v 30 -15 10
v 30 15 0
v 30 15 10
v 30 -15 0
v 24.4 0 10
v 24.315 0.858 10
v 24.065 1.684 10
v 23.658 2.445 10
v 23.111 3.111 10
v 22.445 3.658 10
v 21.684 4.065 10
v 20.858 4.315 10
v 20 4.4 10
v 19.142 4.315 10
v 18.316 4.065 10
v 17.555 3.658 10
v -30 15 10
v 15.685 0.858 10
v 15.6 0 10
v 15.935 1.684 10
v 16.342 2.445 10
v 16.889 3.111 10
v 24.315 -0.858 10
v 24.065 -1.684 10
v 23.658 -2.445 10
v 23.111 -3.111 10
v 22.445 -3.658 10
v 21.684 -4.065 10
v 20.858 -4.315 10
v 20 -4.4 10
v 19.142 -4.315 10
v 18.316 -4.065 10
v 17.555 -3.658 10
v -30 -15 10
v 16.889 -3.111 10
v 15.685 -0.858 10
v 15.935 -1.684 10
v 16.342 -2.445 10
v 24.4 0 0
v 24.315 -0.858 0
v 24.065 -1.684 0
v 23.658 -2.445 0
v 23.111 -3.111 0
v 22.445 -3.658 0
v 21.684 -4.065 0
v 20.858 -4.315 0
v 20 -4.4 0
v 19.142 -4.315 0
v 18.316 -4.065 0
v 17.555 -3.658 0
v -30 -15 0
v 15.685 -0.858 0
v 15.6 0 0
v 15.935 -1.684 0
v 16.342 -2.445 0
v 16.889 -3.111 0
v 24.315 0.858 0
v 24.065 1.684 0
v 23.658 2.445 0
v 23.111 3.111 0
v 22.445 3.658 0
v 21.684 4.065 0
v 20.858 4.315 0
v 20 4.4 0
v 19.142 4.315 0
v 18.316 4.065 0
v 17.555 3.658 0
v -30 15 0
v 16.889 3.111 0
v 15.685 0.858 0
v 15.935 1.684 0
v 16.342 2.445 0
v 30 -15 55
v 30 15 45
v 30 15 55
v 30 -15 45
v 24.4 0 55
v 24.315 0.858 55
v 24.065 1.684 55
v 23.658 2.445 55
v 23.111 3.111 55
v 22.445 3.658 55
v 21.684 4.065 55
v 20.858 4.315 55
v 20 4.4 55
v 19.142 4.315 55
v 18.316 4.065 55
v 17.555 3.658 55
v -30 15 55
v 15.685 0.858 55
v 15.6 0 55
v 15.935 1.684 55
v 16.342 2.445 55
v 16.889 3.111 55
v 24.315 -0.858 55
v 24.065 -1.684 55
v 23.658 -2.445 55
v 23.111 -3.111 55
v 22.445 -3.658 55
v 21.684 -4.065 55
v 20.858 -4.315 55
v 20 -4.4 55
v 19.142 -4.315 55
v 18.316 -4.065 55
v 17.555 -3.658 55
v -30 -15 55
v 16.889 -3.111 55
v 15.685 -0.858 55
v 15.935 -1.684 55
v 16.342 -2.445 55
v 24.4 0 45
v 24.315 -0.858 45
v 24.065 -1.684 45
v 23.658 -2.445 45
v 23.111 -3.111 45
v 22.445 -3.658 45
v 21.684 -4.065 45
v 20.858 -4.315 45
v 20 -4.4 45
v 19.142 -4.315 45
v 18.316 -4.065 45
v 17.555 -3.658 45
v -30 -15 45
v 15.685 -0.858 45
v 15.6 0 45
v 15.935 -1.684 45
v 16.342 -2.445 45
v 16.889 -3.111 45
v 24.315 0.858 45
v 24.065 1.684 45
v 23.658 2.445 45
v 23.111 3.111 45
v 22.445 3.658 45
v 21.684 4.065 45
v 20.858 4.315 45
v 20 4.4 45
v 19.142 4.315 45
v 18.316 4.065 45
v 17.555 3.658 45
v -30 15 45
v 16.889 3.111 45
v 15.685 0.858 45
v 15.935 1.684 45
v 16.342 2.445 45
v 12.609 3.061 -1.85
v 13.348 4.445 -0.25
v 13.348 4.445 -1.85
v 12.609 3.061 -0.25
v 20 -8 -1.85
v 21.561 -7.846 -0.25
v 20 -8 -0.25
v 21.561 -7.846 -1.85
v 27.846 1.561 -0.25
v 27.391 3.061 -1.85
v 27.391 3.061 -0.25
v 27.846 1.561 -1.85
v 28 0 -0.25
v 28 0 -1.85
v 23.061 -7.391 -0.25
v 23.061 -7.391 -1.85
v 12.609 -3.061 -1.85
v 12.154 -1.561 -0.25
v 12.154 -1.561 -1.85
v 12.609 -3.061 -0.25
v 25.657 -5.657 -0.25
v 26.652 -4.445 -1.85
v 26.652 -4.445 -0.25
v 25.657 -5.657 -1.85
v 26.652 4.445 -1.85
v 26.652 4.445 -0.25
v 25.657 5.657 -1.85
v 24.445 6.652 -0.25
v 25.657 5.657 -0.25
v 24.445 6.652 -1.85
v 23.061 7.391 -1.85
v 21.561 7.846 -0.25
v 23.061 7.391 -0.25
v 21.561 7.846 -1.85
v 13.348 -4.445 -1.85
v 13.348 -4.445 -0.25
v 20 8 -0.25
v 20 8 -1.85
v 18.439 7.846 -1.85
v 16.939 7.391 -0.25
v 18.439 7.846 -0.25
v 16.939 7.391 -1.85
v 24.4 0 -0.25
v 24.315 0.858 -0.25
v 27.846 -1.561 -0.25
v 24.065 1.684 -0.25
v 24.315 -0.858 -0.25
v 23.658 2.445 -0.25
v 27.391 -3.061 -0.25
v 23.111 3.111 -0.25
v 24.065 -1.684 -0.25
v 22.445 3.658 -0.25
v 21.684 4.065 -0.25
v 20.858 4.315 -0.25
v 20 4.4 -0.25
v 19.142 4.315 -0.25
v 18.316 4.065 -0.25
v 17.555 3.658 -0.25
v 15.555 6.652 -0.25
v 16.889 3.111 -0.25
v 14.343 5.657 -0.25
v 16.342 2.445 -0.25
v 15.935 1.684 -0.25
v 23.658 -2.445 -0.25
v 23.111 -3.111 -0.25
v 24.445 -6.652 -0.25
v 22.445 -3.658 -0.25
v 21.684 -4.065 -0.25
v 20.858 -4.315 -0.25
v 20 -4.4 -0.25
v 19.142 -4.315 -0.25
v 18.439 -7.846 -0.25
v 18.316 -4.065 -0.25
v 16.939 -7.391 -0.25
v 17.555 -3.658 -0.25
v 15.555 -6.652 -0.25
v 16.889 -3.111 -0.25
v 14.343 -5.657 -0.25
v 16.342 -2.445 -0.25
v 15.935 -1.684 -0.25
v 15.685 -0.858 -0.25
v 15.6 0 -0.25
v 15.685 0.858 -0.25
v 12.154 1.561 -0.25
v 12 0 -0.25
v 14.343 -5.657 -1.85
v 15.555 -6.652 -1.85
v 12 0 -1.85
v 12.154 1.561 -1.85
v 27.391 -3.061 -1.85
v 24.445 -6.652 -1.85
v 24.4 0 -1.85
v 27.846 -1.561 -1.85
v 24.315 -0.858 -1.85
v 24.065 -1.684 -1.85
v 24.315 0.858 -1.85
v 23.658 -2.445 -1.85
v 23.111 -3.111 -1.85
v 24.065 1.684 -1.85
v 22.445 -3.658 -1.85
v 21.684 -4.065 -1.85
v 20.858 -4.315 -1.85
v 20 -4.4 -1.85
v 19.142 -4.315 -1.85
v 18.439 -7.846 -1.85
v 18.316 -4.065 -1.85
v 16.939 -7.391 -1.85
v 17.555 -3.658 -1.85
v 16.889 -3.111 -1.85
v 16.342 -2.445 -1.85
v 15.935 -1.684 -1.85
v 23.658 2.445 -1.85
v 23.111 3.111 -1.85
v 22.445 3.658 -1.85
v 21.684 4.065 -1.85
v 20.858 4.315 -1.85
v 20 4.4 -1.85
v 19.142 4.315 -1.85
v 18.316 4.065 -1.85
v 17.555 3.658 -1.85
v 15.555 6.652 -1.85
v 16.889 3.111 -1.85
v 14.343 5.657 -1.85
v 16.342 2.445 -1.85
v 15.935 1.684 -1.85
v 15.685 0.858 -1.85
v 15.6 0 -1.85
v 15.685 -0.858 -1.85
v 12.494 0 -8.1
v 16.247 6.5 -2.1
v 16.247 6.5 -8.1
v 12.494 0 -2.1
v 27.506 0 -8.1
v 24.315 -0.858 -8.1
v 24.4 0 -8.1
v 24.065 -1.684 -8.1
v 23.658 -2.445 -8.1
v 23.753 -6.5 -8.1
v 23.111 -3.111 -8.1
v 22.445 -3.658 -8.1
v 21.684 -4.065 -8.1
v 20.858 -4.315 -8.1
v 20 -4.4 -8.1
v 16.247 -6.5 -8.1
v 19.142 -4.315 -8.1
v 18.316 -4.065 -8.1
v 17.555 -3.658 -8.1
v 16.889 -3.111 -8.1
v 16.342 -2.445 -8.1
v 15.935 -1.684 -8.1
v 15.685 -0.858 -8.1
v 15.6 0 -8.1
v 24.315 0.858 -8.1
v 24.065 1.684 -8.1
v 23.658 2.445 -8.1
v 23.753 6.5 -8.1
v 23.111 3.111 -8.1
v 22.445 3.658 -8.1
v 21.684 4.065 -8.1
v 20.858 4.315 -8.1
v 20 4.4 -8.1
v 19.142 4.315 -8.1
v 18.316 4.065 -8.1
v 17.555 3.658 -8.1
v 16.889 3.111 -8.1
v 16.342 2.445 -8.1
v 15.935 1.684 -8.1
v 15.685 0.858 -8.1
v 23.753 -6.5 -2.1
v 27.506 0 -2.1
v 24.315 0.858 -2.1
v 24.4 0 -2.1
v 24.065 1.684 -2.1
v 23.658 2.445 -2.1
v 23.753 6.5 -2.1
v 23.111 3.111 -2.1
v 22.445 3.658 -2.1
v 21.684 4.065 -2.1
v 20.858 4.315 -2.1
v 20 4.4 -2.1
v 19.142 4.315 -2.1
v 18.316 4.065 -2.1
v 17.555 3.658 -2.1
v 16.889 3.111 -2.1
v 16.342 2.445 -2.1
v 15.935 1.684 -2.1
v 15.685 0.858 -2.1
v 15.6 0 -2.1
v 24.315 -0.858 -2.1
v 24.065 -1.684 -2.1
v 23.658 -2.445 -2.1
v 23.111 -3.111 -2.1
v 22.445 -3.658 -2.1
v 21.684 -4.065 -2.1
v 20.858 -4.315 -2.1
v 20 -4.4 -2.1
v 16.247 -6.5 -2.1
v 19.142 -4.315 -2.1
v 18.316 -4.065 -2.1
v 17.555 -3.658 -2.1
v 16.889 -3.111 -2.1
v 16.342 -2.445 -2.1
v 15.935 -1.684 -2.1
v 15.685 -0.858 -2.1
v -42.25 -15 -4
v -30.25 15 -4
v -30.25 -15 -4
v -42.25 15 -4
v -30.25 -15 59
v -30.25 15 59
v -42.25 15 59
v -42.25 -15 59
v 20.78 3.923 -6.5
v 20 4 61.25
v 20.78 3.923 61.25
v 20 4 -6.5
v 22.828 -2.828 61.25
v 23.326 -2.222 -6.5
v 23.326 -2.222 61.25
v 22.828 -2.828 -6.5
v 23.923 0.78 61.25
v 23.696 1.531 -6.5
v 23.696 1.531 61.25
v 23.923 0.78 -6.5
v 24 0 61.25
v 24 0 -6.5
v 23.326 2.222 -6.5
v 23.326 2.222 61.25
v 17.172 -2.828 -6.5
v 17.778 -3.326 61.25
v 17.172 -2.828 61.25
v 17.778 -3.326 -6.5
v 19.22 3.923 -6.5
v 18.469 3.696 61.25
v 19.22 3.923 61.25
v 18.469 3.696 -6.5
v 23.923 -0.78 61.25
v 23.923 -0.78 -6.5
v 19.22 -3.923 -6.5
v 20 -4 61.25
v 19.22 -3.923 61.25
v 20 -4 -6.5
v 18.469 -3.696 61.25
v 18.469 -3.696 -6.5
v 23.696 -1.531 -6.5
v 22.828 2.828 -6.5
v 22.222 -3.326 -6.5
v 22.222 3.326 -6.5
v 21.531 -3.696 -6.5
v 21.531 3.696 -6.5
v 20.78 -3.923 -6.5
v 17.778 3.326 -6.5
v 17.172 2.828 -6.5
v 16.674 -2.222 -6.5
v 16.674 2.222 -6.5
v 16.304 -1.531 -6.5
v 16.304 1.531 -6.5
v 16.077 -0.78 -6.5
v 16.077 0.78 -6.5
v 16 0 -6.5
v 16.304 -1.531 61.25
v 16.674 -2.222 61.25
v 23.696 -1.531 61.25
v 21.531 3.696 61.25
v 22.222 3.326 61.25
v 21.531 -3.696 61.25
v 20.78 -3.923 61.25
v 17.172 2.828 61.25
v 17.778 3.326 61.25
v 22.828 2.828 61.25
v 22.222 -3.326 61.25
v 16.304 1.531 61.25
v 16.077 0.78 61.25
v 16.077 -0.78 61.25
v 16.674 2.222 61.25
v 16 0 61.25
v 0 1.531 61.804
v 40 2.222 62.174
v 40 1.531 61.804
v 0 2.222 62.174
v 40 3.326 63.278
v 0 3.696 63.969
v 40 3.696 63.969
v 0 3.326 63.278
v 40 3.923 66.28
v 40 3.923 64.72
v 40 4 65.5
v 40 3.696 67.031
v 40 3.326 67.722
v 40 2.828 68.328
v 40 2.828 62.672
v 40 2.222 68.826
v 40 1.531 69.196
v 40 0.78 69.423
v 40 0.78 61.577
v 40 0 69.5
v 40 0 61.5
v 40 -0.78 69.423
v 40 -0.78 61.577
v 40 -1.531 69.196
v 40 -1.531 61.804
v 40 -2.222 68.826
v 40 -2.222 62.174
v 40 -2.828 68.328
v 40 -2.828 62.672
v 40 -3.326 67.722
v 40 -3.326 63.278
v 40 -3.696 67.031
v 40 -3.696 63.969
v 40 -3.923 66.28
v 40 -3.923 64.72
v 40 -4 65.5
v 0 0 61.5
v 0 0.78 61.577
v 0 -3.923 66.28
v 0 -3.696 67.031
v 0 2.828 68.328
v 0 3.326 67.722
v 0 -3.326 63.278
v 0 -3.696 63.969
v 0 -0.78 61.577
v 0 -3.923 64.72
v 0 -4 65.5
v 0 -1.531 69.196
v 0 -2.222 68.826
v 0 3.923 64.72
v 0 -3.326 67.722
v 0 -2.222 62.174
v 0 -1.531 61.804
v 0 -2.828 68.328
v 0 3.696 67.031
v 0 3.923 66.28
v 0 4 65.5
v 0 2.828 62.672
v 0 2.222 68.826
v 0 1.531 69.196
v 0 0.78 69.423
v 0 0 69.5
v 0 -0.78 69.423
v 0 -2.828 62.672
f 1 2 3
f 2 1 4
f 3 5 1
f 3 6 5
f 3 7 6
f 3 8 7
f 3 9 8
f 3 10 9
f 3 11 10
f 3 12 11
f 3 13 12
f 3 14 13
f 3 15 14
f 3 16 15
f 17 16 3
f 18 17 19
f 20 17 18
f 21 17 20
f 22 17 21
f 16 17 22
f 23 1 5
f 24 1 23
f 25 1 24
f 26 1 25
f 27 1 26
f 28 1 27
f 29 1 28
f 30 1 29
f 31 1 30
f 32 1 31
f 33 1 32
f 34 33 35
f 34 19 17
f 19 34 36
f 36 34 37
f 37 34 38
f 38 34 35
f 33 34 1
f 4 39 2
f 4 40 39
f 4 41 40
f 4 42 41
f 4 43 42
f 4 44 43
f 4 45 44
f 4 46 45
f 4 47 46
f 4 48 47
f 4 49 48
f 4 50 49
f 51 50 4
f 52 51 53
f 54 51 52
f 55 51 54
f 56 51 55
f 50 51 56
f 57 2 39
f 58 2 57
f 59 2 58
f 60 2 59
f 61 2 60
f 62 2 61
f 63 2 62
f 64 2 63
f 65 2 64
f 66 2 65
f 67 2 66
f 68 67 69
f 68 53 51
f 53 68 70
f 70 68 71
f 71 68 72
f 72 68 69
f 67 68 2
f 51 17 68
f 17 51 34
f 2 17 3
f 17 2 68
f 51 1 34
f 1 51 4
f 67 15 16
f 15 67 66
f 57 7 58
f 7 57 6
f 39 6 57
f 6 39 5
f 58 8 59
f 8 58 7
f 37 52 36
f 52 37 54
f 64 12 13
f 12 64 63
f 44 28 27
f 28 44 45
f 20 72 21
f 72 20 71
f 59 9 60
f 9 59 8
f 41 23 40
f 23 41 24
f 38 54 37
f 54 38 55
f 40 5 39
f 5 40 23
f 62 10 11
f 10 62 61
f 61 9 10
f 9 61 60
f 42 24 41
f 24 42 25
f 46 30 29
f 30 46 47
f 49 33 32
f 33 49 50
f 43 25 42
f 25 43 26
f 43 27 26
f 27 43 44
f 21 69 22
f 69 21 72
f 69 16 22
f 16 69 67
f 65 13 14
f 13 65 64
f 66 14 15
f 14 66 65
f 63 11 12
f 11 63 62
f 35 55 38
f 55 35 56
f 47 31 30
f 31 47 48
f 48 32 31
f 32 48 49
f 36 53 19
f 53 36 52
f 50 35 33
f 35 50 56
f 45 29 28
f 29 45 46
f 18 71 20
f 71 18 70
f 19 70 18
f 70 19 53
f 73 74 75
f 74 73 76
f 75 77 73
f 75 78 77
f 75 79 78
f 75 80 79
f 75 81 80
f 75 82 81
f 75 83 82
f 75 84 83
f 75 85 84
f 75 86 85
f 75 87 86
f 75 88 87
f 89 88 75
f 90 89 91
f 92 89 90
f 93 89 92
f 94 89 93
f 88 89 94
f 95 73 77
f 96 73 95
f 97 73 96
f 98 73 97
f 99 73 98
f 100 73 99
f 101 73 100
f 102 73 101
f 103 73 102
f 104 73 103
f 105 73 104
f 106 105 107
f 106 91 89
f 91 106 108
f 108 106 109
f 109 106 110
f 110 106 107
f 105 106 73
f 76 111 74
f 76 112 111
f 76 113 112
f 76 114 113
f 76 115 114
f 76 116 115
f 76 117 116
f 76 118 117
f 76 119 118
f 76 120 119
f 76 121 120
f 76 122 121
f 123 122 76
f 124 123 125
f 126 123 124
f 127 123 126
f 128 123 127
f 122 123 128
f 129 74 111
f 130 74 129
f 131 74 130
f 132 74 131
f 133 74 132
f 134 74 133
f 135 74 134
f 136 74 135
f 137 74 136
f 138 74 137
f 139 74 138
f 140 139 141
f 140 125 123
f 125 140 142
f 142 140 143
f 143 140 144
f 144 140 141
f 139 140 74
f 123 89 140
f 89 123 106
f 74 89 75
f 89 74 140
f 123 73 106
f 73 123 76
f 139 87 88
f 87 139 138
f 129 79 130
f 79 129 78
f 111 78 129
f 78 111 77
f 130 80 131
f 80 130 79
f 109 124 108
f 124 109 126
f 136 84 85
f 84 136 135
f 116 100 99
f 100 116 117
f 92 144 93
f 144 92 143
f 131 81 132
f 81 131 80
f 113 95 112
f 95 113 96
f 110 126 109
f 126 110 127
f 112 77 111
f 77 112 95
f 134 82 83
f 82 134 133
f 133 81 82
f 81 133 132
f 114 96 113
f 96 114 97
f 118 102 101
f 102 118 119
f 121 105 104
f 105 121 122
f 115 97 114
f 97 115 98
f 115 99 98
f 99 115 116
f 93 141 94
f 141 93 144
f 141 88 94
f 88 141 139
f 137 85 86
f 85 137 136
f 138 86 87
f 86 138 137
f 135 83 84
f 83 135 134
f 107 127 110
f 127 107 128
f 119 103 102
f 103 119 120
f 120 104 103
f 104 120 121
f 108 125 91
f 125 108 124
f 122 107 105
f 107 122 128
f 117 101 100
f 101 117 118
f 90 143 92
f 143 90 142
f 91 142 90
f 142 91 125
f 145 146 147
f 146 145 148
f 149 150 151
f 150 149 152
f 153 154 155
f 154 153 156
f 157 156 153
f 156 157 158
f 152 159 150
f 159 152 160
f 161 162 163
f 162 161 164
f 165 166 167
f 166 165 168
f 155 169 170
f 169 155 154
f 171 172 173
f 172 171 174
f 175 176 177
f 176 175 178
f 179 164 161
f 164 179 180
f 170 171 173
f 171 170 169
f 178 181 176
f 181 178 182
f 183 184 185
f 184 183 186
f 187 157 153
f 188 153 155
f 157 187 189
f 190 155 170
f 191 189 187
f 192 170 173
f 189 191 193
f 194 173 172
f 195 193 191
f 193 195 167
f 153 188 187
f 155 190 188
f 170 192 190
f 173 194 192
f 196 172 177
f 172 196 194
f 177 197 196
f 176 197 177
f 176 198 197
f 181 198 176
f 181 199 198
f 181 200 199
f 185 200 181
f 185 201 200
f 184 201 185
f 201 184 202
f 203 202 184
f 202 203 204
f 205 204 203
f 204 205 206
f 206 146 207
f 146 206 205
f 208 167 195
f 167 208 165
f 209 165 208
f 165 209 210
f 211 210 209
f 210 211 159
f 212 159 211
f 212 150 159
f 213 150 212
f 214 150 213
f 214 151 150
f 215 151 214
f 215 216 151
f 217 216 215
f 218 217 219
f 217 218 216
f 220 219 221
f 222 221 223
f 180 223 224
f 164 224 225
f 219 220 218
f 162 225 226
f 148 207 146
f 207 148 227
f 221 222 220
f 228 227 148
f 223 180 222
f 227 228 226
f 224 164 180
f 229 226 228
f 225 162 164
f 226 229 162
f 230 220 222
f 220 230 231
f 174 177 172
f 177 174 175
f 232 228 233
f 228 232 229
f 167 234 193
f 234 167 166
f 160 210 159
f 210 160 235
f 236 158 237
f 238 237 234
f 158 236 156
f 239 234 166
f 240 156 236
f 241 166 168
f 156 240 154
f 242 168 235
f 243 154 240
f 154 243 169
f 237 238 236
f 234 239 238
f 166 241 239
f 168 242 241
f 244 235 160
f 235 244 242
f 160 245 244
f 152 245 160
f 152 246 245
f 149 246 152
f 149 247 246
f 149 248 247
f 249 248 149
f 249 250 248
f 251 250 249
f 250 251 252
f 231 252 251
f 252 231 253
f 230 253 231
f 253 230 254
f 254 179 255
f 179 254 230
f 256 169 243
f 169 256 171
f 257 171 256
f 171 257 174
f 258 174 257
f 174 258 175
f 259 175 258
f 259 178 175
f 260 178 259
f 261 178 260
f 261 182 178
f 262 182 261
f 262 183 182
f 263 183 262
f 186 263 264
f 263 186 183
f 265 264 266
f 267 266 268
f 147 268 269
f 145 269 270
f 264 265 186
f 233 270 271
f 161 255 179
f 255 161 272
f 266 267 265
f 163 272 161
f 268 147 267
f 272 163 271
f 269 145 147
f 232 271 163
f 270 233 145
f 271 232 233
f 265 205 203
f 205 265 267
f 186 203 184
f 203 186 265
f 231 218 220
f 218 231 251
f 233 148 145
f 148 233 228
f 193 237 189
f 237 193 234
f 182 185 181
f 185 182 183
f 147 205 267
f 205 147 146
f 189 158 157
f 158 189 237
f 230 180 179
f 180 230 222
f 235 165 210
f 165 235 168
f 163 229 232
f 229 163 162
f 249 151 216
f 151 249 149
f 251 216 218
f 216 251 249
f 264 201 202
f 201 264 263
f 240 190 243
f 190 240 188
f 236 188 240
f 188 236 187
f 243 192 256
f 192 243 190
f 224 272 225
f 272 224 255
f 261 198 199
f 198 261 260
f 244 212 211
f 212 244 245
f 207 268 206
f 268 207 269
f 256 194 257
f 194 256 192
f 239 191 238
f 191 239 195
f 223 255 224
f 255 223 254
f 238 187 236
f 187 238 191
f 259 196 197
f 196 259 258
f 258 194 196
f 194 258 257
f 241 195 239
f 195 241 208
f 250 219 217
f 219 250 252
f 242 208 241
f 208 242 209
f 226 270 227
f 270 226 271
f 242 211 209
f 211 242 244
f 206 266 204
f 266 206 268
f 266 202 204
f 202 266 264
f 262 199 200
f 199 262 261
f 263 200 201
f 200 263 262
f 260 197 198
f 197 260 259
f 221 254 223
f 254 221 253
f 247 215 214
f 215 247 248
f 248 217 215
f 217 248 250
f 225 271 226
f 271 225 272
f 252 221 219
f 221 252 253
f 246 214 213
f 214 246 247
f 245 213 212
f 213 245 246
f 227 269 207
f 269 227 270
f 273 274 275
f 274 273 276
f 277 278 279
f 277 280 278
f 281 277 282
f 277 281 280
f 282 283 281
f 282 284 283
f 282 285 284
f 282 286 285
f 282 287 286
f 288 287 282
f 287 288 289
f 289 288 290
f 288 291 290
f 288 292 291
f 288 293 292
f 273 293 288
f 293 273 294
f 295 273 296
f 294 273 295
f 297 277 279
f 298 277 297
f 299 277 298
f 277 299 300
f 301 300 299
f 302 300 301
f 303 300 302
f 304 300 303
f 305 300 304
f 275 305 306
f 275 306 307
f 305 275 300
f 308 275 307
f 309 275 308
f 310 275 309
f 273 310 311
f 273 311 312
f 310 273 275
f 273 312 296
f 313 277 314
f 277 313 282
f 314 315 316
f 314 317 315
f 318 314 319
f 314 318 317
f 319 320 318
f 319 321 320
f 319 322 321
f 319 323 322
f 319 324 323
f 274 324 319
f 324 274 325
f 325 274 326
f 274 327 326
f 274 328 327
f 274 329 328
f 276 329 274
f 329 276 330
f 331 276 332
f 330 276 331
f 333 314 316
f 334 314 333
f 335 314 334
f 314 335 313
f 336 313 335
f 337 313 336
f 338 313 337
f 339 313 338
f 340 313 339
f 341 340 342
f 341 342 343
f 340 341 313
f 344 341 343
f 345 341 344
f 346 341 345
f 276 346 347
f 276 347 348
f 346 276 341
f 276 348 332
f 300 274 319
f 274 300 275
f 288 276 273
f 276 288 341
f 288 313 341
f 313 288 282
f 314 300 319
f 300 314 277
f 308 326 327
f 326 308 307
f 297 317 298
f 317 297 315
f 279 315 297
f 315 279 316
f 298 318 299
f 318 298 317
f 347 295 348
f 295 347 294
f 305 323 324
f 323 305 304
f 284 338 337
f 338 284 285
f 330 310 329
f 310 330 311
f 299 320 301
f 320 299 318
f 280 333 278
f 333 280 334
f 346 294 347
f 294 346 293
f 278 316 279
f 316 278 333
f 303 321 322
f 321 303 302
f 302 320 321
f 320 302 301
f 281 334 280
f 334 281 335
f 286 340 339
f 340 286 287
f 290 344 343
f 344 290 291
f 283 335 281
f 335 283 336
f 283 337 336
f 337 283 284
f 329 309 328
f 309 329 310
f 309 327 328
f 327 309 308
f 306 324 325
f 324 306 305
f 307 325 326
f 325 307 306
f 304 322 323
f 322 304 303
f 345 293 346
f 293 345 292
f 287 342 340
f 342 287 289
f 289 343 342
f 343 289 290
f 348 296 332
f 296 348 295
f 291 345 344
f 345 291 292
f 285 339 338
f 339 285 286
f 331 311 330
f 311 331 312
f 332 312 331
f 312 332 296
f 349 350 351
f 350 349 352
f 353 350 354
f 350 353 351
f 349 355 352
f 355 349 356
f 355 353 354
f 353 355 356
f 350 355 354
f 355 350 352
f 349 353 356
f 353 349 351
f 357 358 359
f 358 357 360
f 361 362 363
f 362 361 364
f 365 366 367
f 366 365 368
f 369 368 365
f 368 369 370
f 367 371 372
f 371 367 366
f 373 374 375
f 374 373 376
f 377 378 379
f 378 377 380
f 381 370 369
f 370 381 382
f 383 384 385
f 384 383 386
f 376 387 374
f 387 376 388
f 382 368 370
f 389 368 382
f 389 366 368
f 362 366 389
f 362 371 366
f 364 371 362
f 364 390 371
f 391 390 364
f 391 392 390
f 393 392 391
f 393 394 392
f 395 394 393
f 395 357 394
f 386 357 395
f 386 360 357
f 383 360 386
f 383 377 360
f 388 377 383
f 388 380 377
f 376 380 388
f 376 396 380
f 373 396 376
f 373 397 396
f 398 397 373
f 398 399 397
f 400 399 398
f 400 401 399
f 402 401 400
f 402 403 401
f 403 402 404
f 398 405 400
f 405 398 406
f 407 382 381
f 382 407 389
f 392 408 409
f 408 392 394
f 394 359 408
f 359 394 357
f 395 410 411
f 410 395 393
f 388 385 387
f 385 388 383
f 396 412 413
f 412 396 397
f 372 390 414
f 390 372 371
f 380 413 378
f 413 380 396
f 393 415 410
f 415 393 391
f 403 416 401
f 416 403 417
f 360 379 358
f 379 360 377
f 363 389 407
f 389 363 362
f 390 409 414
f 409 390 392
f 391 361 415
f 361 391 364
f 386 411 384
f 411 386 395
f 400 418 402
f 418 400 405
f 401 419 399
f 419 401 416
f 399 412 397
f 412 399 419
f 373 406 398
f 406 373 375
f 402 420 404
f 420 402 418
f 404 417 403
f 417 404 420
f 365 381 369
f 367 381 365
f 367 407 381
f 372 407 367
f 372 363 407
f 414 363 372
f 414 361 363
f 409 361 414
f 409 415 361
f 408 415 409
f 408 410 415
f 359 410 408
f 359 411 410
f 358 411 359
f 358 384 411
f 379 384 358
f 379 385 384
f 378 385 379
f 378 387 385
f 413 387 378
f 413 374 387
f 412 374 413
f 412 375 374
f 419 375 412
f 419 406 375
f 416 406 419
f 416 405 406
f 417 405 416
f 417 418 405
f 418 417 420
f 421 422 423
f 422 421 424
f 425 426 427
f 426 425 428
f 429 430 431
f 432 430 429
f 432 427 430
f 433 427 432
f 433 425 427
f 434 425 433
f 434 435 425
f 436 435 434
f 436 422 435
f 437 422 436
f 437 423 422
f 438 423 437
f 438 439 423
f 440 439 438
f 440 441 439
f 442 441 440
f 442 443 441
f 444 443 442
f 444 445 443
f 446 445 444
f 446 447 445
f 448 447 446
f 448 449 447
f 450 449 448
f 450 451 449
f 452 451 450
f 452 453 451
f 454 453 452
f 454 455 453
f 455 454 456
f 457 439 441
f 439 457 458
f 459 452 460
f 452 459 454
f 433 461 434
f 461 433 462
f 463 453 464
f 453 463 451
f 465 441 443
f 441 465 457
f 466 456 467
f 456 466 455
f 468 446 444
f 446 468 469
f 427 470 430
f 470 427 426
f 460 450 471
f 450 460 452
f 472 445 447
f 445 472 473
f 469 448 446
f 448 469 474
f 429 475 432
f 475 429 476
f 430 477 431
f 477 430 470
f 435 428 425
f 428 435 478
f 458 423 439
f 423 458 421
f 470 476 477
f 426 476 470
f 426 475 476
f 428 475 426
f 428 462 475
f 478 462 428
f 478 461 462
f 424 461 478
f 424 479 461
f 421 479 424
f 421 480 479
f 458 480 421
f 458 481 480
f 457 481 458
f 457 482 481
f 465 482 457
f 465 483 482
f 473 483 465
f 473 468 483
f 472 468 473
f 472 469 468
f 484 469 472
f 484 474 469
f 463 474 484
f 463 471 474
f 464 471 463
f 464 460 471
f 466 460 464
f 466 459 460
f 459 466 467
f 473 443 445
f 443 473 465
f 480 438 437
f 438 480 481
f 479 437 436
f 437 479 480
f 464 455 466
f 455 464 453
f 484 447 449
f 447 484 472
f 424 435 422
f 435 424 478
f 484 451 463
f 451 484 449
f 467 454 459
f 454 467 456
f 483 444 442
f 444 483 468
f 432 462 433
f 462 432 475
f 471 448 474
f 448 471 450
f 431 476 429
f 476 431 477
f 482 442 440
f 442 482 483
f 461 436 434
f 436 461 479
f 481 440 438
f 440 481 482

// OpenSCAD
$fn = 32;

// ------------------------------------------------------------------------
// C clamp: throat 45 mm, screw d8
// Every part is its own module, assembly() places every instance.
// ------------------------------------------------------------------------

// --- part 1 ---
module clamp_arm() {
  difference() {
    translate([-30, -15, 0]) cube([60, 30, 10]);
    translate([20, 0, -1]) cylinder(h = 12, d = 8.8);
  }
}

// --- part 2 ---
module clamp_spine() {
  difference() {
    translate([-31.5, -15, 0]) cube([63, 30, 12]);
  }
}

// --- part 3 ---
module clamp_screw() {
  translate([0, 0, -33.875]) cylinder(h = 67.75, d = 8);
}

// --- part 4 ---
module clamp_washer() {
  difference() {
      translate([0, 0, 0]) cylinder(h = 1.6, d = 16);
      translate([0, 0, -1]) cylinder(h = 3.6, d = 8.8);
    }
}

// --- part 5 ---
module clamp_nut() {
  difference() {
    linear_extrude(height = 6) polygon(points = [[7.506, 0], [3.753, 6.5], [-3.753, 6.5], [-7.506, 0], [-3.753, -6.5], [3.753, -6.5]]);
    translate([0, 0, -1]) cylinder(h = 8, d = 8.8);
  }
}

// --- part 6 ---
module tommy_bar() {
  translate([0, 0, -20]) cylinder(h = 40, d = 8);
}

// --- assembly ---
module assembly() {
  color([0.80, 0.24, 0.20]) translate([0, 0, 0]) rotate([0, 0, 0]) clamp_arm();
  color([0.20, 0.45, 0.75]) translate([0, 0, 45]) rotate([0, 0, 0]) clamp_arm();
  color([0.25, 0.62, 0.32]) translate([-42.25, 0, 27.5]) rotate([0, 90, 0]) clamp_spine();
  color([0.92, 0.70, 0.18]) translate([20, 0, 27.375]) rotate([0, 0, 0]) clamp_screw();
  color([0.58, 0.35, 0.70]) translate([20, 0, -1.85]) rotate([0, 0, 0]) clamp_washer();
  color([0.16, 0.66, 0.66]) translate([20, 0, -8.1]) rotate([0, 0, 0]) clamp_nut();
  color([0.85, 0.48, 0.18]) translate([20, 0, 65.5]) rotate([0, 90, 0]) tommy_bar();
}

assembly();
